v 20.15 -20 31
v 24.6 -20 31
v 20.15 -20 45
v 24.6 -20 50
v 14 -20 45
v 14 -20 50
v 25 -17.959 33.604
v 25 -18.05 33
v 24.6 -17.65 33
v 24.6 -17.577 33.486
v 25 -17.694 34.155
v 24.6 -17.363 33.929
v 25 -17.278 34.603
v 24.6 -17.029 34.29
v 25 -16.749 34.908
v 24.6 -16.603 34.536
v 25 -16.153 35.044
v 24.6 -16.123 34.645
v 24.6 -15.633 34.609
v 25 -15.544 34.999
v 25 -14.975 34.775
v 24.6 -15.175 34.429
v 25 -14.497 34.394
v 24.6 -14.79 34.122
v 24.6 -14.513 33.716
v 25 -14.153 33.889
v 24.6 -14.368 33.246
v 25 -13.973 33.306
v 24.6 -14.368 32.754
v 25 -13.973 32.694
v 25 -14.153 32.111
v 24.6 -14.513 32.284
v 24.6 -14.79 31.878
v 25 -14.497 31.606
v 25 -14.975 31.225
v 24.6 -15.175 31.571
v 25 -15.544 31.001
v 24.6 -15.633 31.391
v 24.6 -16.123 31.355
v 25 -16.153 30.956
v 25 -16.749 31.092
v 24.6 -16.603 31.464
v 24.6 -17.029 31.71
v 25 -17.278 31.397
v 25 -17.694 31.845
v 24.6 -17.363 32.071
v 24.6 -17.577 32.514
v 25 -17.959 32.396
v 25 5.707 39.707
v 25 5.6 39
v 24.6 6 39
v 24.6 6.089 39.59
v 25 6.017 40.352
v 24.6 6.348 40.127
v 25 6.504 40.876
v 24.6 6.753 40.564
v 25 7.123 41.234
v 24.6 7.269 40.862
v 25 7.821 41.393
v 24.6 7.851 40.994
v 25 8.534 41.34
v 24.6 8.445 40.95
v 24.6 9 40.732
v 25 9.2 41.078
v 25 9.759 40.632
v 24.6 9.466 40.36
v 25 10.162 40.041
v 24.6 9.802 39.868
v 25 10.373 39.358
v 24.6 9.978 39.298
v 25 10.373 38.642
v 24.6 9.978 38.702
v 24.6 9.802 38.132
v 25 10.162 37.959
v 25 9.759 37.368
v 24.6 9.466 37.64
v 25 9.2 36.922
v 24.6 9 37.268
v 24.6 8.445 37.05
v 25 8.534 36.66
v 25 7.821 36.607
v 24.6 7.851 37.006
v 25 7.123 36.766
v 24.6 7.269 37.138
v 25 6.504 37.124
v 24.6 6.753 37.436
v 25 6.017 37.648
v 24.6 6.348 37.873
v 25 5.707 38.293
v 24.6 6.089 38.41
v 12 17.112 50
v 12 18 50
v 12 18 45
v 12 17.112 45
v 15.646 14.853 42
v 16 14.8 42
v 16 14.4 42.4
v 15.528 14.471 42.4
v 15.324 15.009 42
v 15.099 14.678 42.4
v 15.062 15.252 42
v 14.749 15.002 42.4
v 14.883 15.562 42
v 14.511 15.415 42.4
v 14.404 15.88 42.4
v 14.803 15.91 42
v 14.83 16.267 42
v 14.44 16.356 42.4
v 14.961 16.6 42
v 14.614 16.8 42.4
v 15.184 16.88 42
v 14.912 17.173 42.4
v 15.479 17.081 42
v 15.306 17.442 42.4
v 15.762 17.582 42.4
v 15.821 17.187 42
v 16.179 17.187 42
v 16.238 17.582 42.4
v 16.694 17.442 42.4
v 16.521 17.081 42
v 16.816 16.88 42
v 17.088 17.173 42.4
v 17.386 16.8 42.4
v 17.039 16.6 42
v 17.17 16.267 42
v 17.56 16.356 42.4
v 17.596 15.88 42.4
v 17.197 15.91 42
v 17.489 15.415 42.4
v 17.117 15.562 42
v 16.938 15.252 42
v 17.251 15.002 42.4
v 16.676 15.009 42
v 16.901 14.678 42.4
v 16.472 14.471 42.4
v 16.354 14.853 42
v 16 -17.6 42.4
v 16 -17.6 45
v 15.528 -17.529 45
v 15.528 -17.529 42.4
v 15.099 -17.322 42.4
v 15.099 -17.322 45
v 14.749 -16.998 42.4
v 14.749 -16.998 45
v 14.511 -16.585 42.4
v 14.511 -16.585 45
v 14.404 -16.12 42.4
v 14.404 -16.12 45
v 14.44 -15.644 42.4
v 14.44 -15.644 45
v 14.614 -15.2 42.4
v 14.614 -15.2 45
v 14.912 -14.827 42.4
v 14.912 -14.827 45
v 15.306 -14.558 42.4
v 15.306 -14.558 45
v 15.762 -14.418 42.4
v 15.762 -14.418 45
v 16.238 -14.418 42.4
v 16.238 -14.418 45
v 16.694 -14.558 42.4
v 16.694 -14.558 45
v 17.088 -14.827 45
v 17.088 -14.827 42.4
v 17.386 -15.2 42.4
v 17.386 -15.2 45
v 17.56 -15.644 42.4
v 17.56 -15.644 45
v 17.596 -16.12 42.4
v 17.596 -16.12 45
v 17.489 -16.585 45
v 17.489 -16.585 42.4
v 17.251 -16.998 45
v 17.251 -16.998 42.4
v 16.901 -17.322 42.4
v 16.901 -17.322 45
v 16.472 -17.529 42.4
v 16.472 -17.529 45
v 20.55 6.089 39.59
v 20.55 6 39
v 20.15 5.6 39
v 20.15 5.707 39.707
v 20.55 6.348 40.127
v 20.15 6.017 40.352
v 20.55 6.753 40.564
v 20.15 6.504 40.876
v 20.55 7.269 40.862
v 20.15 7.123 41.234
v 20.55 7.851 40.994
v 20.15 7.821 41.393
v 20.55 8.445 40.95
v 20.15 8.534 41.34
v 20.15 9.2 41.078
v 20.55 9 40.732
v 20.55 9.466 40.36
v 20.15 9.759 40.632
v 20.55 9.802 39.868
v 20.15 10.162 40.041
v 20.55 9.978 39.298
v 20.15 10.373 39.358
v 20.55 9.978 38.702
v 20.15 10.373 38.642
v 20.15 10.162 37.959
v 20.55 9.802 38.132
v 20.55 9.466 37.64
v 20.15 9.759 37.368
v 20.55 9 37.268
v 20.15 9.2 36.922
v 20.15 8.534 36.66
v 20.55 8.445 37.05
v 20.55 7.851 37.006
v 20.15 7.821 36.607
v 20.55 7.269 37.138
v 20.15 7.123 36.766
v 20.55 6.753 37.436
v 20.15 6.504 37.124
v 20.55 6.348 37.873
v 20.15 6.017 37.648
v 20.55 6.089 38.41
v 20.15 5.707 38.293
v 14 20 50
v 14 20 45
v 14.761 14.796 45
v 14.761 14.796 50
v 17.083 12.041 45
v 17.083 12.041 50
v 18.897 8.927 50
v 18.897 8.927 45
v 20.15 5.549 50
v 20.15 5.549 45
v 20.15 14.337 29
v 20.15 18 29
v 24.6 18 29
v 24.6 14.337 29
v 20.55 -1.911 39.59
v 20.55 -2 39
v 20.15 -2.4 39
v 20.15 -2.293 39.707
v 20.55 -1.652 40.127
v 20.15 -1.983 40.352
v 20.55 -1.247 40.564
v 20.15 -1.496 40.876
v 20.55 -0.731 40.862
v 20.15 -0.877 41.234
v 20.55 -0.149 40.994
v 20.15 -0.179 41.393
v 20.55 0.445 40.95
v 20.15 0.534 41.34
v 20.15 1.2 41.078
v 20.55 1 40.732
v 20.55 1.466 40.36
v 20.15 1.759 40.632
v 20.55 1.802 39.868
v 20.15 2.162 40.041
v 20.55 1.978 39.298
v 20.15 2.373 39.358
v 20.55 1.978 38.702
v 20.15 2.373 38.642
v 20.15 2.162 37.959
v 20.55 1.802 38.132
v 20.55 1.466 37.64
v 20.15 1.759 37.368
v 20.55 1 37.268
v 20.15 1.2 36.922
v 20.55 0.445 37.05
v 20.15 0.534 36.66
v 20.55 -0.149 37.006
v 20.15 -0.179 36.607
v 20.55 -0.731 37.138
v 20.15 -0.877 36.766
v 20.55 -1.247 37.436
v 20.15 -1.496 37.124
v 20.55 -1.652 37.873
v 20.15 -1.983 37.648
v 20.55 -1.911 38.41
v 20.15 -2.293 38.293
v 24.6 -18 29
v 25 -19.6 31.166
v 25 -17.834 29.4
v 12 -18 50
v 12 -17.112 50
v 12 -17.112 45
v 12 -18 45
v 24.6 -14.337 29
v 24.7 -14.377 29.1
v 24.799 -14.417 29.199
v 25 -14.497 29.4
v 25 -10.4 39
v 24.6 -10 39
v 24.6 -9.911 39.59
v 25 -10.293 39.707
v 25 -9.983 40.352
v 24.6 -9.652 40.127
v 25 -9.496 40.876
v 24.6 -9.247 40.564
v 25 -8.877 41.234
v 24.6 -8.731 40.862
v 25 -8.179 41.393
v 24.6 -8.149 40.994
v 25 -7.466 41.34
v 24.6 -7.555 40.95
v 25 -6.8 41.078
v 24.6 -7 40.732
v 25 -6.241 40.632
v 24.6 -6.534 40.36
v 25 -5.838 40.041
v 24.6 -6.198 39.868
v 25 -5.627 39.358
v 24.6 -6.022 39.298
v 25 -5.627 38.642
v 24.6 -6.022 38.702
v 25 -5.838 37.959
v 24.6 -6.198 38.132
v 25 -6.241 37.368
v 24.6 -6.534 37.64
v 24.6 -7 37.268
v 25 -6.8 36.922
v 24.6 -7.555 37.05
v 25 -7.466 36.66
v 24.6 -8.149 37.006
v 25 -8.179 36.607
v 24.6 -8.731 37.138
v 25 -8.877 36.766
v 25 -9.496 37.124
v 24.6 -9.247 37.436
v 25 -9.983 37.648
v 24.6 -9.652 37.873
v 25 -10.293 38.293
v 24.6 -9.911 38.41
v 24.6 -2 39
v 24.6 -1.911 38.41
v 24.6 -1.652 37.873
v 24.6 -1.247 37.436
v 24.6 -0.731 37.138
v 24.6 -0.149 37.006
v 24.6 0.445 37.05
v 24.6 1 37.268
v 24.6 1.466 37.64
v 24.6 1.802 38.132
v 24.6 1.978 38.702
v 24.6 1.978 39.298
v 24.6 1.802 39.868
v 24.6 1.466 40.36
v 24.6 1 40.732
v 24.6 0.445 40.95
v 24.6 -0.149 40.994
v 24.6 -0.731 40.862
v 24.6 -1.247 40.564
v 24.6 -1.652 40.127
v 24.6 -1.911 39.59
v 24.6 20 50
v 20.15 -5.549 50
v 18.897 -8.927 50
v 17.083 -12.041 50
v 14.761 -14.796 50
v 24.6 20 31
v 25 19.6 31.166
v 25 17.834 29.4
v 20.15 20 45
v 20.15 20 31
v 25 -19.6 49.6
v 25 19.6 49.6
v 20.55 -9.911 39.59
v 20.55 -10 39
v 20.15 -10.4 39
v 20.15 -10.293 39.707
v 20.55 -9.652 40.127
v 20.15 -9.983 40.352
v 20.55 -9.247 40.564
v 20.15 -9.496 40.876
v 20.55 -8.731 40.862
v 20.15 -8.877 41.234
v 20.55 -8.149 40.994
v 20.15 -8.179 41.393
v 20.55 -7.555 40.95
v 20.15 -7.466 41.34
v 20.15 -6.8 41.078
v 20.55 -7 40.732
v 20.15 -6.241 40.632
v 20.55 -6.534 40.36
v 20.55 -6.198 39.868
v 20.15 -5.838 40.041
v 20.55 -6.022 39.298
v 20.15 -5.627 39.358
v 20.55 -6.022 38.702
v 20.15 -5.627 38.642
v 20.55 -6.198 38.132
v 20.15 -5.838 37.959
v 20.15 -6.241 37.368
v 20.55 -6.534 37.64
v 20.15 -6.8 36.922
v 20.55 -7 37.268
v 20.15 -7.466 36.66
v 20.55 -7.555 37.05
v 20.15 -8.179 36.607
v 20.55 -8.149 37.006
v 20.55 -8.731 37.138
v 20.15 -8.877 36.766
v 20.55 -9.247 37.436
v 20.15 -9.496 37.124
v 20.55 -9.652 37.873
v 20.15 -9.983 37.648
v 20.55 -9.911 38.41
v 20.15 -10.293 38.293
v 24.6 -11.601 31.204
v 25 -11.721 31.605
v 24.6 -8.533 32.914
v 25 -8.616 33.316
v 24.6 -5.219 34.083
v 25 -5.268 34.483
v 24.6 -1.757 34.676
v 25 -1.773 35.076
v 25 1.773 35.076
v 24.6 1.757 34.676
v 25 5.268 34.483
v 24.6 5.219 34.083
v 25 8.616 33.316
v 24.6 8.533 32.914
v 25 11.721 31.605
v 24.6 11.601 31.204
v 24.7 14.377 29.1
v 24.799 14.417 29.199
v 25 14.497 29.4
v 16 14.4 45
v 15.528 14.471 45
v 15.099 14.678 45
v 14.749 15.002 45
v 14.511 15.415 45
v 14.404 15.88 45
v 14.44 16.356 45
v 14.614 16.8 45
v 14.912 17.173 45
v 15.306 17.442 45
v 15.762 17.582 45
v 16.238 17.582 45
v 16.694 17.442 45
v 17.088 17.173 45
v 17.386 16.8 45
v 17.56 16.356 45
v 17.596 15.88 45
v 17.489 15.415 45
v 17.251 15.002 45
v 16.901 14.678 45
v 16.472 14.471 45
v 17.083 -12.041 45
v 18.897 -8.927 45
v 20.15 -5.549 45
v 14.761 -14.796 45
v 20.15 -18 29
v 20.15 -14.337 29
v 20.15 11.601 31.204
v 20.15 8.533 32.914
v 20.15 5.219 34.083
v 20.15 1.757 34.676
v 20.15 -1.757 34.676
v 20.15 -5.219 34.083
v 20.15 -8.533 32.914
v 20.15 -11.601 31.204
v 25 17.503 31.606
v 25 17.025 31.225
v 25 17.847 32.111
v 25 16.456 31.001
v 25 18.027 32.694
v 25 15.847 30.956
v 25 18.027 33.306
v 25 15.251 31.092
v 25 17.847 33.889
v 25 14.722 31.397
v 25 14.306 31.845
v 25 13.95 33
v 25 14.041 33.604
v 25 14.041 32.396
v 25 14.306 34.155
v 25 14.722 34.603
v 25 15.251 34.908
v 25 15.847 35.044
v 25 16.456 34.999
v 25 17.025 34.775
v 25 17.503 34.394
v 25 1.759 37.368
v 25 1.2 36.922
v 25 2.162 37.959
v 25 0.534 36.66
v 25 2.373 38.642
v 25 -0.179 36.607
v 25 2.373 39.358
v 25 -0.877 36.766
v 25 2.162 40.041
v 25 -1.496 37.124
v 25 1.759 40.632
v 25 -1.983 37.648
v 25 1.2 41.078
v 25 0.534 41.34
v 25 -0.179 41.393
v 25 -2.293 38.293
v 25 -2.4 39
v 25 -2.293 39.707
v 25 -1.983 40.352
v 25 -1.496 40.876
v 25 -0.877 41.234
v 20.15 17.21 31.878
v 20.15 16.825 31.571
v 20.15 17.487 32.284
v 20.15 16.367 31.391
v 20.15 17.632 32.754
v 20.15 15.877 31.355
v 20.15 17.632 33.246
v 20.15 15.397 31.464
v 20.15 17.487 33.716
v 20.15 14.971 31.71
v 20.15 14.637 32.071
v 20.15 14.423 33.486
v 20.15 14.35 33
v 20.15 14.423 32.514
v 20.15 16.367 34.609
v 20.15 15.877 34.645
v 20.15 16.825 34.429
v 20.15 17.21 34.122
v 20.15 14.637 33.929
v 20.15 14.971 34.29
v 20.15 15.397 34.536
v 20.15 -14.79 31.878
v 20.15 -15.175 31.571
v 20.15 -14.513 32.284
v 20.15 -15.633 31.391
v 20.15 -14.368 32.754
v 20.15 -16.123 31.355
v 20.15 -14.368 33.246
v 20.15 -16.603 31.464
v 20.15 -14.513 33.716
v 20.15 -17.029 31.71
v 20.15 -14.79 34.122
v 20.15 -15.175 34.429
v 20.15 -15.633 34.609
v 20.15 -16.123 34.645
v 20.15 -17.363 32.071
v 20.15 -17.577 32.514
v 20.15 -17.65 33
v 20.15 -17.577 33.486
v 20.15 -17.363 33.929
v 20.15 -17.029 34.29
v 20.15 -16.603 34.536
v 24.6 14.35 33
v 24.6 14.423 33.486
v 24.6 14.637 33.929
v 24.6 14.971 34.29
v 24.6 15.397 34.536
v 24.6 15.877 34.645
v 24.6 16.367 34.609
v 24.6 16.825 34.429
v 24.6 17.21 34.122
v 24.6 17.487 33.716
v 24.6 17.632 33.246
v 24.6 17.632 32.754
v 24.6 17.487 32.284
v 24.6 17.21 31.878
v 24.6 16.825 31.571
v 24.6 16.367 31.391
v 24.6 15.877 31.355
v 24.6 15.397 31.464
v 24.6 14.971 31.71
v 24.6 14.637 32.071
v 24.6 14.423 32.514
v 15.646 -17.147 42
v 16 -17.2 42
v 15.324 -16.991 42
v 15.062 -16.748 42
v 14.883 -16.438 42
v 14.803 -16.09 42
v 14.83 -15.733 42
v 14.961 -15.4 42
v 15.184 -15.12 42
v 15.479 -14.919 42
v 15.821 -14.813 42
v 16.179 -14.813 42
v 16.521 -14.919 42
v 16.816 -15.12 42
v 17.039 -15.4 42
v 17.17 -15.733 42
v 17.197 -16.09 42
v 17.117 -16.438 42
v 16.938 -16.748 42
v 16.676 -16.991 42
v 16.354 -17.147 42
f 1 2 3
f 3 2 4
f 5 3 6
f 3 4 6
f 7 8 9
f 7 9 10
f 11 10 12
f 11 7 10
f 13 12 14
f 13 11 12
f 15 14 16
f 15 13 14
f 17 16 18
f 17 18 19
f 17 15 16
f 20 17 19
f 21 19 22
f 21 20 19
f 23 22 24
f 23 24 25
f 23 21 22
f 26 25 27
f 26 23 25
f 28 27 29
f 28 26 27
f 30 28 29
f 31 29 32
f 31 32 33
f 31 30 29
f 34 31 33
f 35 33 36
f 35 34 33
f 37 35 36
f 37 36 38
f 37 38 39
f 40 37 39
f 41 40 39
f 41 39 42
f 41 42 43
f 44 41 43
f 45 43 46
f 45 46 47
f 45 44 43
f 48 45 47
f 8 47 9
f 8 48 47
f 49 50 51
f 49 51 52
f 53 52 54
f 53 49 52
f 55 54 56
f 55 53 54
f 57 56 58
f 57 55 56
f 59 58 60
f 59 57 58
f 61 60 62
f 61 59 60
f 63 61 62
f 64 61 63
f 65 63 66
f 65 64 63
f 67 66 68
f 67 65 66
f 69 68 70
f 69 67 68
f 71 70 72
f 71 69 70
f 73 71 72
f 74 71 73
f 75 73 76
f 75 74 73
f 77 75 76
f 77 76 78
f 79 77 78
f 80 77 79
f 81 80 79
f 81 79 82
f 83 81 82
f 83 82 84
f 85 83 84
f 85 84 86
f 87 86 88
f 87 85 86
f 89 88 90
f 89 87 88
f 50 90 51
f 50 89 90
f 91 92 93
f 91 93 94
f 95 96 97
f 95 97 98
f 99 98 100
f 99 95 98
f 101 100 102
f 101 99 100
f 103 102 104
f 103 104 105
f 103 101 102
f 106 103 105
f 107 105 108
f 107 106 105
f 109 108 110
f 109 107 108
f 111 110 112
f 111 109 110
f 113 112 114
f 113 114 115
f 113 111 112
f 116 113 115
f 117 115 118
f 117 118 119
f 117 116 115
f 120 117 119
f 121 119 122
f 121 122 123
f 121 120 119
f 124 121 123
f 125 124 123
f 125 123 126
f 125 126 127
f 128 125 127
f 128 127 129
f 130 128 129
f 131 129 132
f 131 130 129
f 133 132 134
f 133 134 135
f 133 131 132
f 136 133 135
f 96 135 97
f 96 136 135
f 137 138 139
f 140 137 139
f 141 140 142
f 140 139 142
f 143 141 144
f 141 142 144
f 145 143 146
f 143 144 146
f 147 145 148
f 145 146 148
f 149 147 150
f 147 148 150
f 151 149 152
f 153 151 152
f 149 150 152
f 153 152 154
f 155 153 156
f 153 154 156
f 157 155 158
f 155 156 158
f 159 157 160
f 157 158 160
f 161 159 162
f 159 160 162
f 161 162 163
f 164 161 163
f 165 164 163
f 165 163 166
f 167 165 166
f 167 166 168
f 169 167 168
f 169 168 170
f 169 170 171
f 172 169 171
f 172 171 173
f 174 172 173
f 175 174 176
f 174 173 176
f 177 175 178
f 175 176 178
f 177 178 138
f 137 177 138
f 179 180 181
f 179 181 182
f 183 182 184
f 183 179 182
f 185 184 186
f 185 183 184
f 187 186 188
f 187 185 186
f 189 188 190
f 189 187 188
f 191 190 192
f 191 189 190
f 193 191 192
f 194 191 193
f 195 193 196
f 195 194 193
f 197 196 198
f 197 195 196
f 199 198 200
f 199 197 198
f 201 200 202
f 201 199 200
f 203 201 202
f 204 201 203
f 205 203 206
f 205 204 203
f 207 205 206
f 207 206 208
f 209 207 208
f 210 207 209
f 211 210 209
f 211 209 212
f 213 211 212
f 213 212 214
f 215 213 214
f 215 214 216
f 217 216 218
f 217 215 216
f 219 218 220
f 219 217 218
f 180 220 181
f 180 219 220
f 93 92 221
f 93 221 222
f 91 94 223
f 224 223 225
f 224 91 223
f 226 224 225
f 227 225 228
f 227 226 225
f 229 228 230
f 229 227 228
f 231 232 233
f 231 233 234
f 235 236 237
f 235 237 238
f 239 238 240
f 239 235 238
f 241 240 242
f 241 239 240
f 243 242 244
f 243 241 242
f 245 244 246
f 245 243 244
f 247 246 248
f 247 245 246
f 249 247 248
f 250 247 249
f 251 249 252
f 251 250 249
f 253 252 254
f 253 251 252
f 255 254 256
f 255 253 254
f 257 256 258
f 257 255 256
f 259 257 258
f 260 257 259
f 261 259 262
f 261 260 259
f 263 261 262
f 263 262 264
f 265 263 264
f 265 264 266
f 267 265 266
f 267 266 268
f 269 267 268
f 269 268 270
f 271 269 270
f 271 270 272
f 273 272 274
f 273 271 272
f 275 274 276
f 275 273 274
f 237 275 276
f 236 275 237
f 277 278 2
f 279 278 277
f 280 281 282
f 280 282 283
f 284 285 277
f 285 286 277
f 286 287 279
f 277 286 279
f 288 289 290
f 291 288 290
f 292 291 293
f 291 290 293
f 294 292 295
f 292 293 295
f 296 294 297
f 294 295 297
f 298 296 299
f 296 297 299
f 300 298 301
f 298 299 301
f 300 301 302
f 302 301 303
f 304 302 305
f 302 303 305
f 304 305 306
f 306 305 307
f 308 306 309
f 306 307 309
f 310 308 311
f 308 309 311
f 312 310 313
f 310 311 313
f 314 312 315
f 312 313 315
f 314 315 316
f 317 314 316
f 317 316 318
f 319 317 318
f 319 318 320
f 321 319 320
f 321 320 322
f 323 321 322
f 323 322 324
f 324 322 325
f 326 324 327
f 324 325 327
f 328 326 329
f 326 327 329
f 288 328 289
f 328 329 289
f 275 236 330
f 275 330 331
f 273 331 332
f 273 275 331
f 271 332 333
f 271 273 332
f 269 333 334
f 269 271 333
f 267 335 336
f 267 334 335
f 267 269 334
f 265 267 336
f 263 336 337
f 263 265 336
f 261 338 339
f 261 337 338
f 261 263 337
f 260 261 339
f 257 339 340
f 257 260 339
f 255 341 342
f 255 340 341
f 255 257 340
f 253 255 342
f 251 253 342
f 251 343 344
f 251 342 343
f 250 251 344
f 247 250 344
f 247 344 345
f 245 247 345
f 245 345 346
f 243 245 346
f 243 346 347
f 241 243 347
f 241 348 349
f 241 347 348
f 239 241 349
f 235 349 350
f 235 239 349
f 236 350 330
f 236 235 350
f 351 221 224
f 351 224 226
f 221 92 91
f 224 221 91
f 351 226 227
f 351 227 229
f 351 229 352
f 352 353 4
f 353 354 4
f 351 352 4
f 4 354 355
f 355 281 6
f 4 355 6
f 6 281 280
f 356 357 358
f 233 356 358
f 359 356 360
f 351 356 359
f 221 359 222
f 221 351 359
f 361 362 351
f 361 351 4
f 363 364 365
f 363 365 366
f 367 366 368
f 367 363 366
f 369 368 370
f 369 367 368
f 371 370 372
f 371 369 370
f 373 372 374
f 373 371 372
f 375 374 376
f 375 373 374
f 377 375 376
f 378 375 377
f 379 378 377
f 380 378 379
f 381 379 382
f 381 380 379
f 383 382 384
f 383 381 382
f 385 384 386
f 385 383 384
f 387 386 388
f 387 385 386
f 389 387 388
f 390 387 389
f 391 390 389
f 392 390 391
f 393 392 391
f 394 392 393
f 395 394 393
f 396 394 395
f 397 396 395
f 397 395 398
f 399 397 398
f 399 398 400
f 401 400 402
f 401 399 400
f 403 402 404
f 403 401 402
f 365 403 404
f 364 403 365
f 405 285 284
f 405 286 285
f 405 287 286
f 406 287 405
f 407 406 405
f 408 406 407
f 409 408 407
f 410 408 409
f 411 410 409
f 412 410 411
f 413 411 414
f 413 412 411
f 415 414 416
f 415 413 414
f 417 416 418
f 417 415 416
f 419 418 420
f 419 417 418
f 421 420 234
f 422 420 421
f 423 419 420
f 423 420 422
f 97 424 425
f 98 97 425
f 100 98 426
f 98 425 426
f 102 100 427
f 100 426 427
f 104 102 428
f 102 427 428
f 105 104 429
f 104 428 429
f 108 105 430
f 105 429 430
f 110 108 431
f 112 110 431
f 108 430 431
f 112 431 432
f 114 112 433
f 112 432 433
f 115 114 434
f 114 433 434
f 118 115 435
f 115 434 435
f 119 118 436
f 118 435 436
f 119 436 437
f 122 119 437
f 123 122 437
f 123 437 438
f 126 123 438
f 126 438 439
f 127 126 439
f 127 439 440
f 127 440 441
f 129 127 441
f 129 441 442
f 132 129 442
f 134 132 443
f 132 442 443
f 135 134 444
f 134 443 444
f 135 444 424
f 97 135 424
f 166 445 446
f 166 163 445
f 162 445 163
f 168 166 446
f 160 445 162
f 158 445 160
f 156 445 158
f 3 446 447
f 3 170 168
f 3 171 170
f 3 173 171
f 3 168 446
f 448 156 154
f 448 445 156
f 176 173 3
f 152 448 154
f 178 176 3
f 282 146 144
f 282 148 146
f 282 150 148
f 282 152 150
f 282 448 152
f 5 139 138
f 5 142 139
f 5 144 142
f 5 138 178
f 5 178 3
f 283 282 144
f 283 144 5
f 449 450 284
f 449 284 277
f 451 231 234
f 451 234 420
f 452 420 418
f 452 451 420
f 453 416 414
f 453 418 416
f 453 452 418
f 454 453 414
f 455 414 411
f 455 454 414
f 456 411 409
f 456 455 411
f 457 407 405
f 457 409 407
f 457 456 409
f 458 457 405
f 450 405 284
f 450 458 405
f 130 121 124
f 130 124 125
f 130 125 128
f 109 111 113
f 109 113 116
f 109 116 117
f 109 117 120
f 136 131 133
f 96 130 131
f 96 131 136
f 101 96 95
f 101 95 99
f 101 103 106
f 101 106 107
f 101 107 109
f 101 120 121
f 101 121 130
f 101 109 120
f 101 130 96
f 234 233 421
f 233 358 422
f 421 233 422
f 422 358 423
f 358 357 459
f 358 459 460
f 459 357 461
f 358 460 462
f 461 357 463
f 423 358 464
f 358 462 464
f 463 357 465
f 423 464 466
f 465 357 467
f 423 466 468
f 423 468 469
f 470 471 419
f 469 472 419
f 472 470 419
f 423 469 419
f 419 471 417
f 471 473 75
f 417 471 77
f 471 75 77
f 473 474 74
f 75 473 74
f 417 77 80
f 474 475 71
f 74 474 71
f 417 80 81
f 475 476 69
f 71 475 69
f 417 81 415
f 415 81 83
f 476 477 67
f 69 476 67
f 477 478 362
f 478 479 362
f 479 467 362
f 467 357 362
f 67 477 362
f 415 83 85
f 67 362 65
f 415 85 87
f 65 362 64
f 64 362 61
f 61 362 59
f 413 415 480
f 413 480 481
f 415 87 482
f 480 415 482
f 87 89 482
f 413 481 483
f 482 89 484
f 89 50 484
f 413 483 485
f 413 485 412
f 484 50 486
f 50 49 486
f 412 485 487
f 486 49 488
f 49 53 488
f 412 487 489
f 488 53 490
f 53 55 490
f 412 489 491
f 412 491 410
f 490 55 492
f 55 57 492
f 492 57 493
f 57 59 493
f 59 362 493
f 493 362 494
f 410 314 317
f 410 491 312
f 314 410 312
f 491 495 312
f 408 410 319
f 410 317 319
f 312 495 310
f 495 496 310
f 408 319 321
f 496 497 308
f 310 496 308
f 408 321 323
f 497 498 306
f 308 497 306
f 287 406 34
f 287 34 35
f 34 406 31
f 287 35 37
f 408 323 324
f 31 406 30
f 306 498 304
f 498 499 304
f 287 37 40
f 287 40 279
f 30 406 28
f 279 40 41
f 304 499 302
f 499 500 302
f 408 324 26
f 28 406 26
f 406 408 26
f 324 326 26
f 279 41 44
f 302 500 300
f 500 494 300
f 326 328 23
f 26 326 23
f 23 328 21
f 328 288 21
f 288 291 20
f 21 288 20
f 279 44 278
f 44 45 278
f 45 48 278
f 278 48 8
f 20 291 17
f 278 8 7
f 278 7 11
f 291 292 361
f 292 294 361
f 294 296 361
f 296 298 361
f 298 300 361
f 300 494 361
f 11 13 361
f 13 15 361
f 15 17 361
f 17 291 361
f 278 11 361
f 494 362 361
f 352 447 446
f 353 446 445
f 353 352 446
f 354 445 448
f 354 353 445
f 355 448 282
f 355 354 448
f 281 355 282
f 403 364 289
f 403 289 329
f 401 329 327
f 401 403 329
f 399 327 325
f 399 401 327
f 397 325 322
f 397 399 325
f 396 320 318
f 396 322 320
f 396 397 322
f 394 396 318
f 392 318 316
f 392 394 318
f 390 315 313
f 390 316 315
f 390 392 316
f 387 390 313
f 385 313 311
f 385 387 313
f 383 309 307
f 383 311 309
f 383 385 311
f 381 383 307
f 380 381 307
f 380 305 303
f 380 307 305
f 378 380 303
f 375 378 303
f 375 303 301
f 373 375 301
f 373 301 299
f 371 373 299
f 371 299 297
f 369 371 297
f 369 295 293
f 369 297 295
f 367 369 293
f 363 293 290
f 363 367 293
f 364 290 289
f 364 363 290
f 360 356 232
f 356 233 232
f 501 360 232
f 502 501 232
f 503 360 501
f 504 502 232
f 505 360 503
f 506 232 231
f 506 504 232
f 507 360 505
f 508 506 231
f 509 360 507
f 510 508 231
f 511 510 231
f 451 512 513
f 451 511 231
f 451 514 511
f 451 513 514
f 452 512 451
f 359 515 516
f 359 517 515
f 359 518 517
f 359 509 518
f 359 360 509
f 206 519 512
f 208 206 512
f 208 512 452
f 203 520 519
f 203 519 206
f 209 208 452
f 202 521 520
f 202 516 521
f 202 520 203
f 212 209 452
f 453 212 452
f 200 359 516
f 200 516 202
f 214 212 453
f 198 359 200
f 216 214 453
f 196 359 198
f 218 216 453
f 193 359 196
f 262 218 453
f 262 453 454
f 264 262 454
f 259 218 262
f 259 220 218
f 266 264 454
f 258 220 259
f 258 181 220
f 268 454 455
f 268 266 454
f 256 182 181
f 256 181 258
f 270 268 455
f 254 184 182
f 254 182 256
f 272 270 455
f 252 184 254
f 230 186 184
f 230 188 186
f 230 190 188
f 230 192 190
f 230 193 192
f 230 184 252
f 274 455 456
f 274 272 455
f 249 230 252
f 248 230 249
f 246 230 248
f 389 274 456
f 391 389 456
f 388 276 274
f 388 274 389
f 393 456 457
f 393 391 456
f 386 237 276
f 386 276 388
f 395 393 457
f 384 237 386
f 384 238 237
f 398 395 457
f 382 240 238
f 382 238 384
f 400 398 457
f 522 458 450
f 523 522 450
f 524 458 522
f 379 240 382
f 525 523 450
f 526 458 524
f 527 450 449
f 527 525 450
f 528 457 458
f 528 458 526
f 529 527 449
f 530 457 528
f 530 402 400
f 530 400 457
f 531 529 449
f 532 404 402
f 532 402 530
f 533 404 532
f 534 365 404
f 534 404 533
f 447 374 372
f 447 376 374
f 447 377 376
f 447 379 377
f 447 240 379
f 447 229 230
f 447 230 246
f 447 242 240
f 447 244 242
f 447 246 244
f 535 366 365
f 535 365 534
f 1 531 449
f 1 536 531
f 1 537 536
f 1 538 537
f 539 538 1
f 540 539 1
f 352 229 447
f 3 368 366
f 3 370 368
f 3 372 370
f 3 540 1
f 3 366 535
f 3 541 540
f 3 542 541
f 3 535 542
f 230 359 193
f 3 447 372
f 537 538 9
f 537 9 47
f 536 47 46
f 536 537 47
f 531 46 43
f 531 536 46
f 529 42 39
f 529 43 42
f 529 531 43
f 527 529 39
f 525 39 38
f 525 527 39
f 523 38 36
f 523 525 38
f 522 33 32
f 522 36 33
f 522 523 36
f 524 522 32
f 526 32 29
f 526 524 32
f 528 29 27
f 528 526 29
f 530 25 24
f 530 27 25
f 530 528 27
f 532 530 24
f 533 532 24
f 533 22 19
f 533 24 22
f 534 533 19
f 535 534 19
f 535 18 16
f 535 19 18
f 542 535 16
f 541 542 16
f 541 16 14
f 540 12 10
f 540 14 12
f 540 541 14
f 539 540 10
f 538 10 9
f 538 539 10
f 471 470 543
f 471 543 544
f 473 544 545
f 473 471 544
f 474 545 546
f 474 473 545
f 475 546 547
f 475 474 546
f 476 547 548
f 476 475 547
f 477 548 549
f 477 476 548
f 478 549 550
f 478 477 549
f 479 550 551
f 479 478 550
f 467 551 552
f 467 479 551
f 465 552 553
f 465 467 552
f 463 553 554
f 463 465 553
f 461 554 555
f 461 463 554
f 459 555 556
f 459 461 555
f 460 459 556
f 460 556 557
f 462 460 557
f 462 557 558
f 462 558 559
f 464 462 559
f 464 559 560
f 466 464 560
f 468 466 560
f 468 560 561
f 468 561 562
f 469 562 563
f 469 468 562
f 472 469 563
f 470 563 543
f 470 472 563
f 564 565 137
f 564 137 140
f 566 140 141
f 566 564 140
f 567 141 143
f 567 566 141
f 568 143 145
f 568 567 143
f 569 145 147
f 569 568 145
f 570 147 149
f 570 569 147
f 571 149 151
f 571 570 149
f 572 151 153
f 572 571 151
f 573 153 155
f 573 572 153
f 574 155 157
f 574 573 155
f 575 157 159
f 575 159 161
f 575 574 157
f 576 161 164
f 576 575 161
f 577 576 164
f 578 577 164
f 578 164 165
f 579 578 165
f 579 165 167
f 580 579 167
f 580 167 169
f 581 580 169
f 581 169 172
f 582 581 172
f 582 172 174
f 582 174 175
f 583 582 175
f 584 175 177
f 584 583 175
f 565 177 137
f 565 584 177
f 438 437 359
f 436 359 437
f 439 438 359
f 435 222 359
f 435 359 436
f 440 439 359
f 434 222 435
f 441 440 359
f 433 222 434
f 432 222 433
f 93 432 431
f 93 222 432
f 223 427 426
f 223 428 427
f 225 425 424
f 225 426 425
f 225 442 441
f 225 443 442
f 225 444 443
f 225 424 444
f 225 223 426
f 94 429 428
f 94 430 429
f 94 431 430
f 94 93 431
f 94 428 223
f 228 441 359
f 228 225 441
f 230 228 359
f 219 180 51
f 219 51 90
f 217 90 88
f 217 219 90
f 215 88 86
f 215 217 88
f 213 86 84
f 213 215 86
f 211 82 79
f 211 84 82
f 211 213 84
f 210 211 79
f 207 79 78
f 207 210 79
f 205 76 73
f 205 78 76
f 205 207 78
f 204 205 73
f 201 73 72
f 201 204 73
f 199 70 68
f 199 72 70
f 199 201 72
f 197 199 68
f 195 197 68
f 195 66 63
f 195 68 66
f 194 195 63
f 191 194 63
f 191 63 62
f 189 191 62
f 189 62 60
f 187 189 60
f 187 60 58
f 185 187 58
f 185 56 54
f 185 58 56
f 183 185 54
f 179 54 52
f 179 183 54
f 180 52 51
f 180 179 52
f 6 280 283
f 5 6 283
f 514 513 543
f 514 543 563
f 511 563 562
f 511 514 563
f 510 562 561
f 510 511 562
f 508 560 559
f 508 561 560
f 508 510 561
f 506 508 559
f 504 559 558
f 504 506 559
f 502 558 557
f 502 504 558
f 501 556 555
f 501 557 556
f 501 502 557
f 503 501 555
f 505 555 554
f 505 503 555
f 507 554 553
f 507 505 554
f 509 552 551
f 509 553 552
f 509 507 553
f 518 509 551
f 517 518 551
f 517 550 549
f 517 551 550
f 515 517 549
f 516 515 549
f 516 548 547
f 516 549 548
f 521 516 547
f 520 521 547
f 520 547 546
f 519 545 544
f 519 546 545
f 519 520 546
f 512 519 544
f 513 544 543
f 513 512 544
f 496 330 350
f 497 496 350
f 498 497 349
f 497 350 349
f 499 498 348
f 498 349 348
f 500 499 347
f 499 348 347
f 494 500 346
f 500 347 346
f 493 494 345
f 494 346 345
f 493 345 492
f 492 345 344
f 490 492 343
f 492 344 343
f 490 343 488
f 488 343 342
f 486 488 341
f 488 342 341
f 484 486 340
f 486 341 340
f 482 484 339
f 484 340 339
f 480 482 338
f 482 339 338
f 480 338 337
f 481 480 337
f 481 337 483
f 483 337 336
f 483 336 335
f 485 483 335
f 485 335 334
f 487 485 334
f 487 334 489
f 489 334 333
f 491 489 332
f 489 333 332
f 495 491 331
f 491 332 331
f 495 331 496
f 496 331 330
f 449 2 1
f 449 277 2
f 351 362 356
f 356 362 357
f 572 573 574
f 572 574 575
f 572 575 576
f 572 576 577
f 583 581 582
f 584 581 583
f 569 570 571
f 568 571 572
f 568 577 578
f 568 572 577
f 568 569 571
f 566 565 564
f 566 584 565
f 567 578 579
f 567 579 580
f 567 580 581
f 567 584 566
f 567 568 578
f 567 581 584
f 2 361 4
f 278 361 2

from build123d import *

# Parameters (mm, degrees)
CYLINDER023_R                 = 2
CYLINDER023_DEPTH             = 10
CYLINDER024_R                 = 2
CYLINDER024_DEPTH             = 10
CYLINDER025_R                 = 2
CYLINDER025_DEPTH             = 10
CYLINDER020_R                 = 1.65
CYLINDER020_DEPTH             = 10
CYLINDER021_R                 = 1.65
CYLINDER021_DEPTH             = 10
CYLINDER022_R                 = 20.75
CYLINDER022_DEPTH             = 6
BOX005_W                      = 40
BOX005_H                      = 4.85
BOX005_DEPTH                  = 21
CHAMFER007_SIZE               = 2
CYLINDER019_R                 = 1.6
CYLINDER019_DEPTH             = 3
CYLINDER018_R                 = 1.6
CYLINDER018_DEPTH             = 3
CHAMFER006_SIZE               = 0.4
CYLINDER017_R                 = 20.9
CYLINDER017_DEPTH             = 6
BOX004_W                      = 40
BOX004_H                      = 13
BOX004_DEPTH                  = 5
CHAMFER008_SIZE               = 2
CHAMFER009_SIZE               = 0.4
CHAMFER009002_SIZE            = 0.4
CHAMFER009002_ROLL_ANGLE      = 180
CHAMFER009002_PLACEMENT_ANGLE = -90


with BuildPart() as cylinder023:
    # Cylinder023 → Cylinder023 (new body)
    with BuildSketch(Plane(origin=(0, -20, 11), x_dir=(1, 0, 0), z_dir=(0, -1, 0))):
        Circle(CYLINDER023_R)
    extrude(amount=CYLINDER023_DEPTH)


with BuildPart() as cylinder024:
    # Cylinder024 → Cylinder024 (new body)
    with BuildSketch(Plane(origin=(-8, -20, 11), x_dir=(1, 0, 0), z_dir=(0, -1, 0))):
        Circle(CYLINDER024_R)
    extrude(amount=CYLINDER024_DEPTH)


with BuildPart() as fusion001025:
    # Cylinder025 → Cylinder025 (new body)
    with BuildSketch(Plane(origin=(8, -20, 11), x_dir=(1, 0, 0), z_dir=(0, -1, 0))):
        Circle(CYLINDER025_R)
    extrude(amount=CYLINDER025_DEPTH)

    # Fusion001025: union Cylinder023, Cylinder024
    add(cylinder023.part)
    add(cylinder024.part)


with BuildPart() as cylinder020:
    # Cylinder020 → Cylinder020 (new body)
    with BuildSketch(Plane(origin=(16, -19, 17), x_dir=(1, 0, 0), z_dir=(0, -1, 0))):
        Circle(CYLINDER020_R)
    extrude(amount=CYLINDER020_DEPTH)


with BuildPart() as fusion001023:
    # Cylinder021 → Cylinder021 (new body)
    with BuildSketch(Plane(origin=(-16, -19, 17), x_dir=(1, 0, 0), z_dir=(0, -1, 0))):
        Circle(CYLINDER021_R)
    extrude(amount=CYLINDER021_DEPTH)

    # Fusion001023: union Cylinder020
    add(cylinder020.part)


with BuildPart() as cylinder022:
    # Cylinder022 → Cylinder022 (new body)
    with BuildSketch(Plane(origin=(0, -20, 36), x_dir=(1, 0, 0), z_dir=(0, -1, 0))):
        Circle(CYLINDER022_R)
    extrude(amount=CYLINDER022_DEPTH)


with BuildPart() as chamfer007:
    # Box005 → Box005 (new body)
    with BuildSketch(Plane(origin=(-20, -25, 0), x_dir=(1, 0, 0), z_dir=(0, 0, 1))):
        with Locations((20, 2.425)):
            Rectangle(BOX005_W, BOX005_H)
    extrude(amount=BOX005_DEPTH)

    # Cut004003006002: cut Cylinder022
    add(cylinder022.part, mode=Mode.SUBTRACT)

    # Cut004003006003: cut Fusion001023
    add(fusion001023.part, mode=Mode.SUBTRACT)

    # Chamfer007
    chamfer007_edges = [chamfer007.edges().sort_by_distance(p)[0] for p in [
        (-20, -22.575, 21),
        (20, -22.575, 21),
    ]]
    chamfer(chamfer007_edges, length=CHAMFER007_SIZE)


with BuildPart() as cylinder019:
    # Cylinder019 → Cylinder019 (new body)
    with BuildSketch(Plane(origin=(16, -16, 5), x_dir=(1, 0, 0), z_dir=(0, 0, 1))):
        Circle(CYLINDER019_R)
    extrude(amount=CYLINDER019_DEPTH)


with BuildPart() as chamfer006:
    # Cylinder018 → Cylinder018 (new body)
    with BuildSketch(Plane(origin=(-16, -16, 5), x_dir=(1, 0, 0), z_dir=(0, 0, 1))):
        Circle(CYLINDER018_R)
    extrude(amount=CYLINDER018_DEPTH)

    # Fusion001022: union Cylinder019
    add(cylinder019.part)

    # Chamfer006
    chamfer006_edges = [chamfer006.edges().sort_by_distance(p)[0] for p in [
        (-17.6, -16, 8),
        (14.4, -16, 8),
    ]]
    chamfer(chamfer006_edges, length=CHAMFER006_SIZE)


with BuildPart() as cylinder017:
    # Cylinder017 → Cylinder017 (new body)
    with BuildSketch(Plane.XY):
        Circle(CYLINDER017_R)
    extrude(amount=CYLINDER017_DEPTH)


with BuildPart() as chamfer009002:
    # Box004 → Box004 (new body)
    with BuildSketch(Plane(origin=(-20, -25, 0), x_dir=(1, 0, 0), z_dir=(0, 0, 1))):
        with Locations((20, 6.5)):
            Rectangle(BOX004_W, BOX004_H)
    extrude(amount=BOX004_DEPTH)

    # Chamfer008
    chamfer008_edges = [chamfer009002.edges().sort_by_distance(p)[0] for p in [
        (-20, -12, 2.5),
        (20, -12, 2.5),
    ]]
    chamfer(chamfer008_edges, length=CHAMFER008_SIZE)

    # Cut004003006004: cut Cylinder017
    add(cylinder017.part, mode=Mode.SUBTRACT)

    # Fusion001024: union Chamfer007, Chamfer006
    add(chamfer007.part)
    add(chamfer006.part)

    # Cut004003006005: cut Fusion001025
    add(fusion001025.part, mode=Mode.SUBTRACT)

    # Chamfer009
    chamfer009_edges = [chamfer009002.edges().sort_by_distance(p)[0] for p in [
        (-10, -20.15, 11),
        (-2, -20.15, 11),
        (6, -20.15, 11),
    ]]
    chamfer(chamfer009_edges, length=CHAMFER009_SIZE)

    # Chamfer009002
    chamfer009002_edges = [chamfer009002.edges().sort_by_distance(p)[0] for p in [
        (19, -25, 20),
        (16.168725, -25, 21),
        (0, -25, 15.25),
        (-16.168725, -25, 21),
        (-19, -25, 20),
        (-17.65, -25, 17),
        (14.35, -25, 17),
        (-10, -25, 11),
        (-2, -25, 11),
        (6, -25, 11),
        (20, -25, 9.5),
        (0, -25, 0),
        (-20, -25, 9.5),
    ]]
    chamfer(chamfer009002_edges, length=CHAMFER009002_SIZE)


with BuildPart() as chamfer009002_1:
    # Chamfer009002 roll: moved
    add(chamfer009002.part.rotate(Axis((0, 0, 0), (1, 0, 0)), CHAMFER009002_ROLL_ANGLE))


with BuildPart() as chamfer009002_2:
    # Chamfer009002 placement: moved
    add(chamfer009002_1.part.moved(Location((0, 0, 50))).rotate(Axis((0, 0, 50), (0, 0, 1)), CHAMFER009002_PLACEMENT_ANGLE))


solid = chamfer009002_2.part
